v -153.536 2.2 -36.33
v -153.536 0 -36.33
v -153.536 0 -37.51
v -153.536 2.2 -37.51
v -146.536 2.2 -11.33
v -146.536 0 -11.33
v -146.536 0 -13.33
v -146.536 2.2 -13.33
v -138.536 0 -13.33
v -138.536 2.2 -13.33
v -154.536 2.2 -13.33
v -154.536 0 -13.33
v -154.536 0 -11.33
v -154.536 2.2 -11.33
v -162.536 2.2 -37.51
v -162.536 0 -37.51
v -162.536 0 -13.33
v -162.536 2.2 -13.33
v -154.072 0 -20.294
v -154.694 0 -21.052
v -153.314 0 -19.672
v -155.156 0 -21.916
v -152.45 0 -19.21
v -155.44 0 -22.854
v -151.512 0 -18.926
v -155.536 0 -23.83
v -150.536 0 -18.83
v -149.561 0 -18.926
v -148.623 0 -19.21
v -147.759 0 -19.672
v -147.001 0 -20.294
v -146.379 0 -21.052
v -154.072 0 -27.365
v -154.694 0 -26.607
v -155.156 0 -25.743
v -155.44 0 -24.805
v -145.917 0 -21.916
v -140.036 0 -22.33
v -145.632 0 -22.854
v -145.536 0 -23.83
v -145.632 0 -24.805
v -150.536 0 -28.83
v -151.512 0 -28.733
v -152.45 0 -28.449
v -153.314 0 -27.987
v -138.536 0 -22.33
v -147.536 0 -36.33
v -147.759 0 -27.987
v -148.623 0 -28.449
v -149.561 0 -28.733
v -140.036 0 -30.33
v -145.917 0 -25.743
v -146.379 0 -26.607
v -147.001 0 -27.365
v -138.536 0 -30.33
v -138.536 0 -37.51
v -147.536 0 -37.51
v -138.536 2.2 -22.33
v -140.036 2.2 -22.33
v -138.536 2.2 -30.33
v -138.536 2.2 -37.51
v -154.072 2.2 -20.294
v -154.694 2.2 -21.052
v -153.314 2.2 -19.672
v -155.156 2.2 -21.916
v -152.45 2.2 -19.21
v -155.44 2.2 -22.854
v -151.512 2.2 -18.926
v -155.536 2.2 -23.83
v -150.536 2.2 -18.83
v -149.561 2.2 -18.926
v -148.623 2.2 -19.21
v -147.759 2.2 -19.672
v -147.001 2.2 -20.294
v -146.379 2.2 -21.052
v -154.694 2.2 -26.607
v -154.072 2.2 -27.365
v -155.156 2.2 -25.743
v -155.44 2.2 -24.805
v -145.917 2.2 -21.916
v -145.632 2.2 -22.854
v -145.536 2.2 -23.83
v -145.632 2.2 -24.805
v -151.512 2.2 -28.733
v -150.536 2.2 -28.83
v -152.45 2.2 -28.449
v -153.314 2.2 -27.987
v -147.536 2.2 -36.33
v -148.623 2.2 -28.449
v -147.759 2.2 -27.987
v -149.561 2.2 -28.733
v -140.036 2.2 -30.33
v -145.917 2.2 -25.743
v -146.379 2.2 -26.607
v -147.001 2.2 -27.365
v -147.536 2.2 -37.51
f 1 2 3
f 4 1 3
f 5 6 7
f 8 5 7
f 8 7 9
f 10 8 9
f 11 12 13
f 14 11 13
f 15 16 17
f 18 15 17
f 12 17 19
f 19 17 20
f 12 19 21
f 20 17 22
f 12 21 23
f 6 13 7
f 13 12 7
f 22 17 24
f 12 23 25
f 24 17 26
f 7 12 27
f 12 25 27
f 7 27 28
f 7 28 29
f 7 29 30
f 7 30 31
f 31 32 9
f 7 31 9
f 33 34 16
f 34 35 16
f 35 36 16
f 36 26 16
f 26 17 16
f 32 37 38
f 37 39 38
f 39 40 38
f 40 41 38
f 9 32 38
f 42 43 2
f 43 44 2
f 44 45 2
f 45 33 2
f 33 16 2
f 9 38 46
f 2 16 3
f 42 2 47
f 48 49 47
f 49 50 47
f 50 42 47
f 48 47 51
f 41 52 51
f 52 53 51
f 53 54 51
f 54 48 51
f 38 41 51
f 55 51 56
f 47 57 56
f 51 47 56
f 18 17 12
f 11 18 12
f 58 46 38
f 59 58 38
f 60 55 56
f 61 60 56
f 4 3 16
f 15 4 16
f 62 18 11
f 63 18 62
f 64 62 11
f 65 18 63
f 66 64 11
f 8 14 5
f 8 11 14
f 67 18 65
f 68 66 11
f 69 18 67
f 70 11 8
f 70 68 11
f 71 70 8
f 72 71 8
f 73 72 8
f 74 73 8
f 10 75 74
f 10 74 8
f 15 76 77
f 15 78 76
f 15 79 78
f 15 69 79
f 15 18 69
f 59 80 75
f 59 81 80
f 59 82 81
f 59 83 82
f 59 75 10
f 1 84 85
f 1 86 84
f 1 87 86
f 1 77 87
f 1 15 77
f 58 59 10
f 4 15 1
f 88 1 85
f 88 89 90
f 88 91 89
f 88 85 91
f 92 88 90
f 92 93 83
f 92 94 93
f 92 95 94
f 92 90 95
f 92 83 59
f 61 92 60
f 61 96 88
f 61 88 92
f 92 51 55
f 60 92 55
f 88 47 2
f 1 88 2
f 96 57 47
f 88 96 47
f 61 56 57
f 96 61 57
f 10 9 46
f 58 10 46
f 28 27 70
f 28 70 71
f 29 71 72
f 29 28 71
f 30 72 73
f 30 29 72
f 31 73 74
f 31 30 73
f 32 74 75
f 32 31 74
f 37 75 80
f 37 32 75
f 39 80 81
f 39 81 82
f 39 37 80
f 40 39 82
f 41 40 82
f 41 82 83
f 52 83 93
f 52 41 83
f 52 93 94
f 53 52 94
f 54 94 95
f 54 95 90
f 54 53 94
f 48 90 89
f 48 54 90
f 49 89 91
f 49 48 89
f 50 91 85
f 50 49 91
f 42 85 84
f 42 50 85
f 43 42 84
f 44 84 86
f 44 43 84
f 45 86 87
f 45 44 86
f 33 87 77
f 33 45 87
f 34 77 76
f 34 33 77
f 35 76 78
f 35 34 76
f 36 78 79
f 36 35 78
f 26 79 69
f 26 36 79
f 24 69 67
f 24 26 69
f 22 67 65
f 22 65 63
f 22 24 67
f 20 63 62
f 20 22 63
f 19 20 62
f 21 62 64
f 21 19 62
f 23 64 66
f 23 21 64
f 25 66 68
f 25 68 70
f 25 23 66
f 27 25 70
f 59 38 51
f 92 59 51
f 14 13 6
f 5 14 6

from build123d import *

# Parameters (mm, degrees)
SKETCH1_R           = 5
BOSS_EXTRUDE1_DEPTH = 2.2


with BuildPart() as part:
    # Sketch1 → Boss-Extrude1 (new body)
    with BuildSketch(Plane(origin=(0, 0, 0), x_dir=(1, 0, 0), z_dir=(0, 1, 0))):
        Polygon((-154.536383046, 11.329521193), (-146.536383046, 11.329521193), (-146.536383046, 13.329521193), (-138.536383046, 13.329521193), (-138.536383046, 16.329521193), (-138.536383046, 22.329521193), (-140.036383046, 22.329521193), (-140.036383046, 30.329521193), (-138.536383046, 30.329521193), (-138.536383046, 36.329521193), (-138.536383046, 37.509521193), (-147.536383046, 37.509521193), (-147.536383046, 36.329521193), (-153.536383046, 36.329521193), (-153.536383046, 37.509521193), (-162.536383046, 37.509521193), (-162.536383046, 36.329521193), (-162.536383046, 13.329521193), (-154.536383046, 13.329521193), align=None)
        with Locations(Location((-150.536383046, 23.829521193, 0), (0, 0, 270))):
            Circle(SKETCH1_R, mode=Mode.SUBTRACT)
    extrude(amount=BOSS_EXTRUDE1_DEPTH)


solid = part.part
